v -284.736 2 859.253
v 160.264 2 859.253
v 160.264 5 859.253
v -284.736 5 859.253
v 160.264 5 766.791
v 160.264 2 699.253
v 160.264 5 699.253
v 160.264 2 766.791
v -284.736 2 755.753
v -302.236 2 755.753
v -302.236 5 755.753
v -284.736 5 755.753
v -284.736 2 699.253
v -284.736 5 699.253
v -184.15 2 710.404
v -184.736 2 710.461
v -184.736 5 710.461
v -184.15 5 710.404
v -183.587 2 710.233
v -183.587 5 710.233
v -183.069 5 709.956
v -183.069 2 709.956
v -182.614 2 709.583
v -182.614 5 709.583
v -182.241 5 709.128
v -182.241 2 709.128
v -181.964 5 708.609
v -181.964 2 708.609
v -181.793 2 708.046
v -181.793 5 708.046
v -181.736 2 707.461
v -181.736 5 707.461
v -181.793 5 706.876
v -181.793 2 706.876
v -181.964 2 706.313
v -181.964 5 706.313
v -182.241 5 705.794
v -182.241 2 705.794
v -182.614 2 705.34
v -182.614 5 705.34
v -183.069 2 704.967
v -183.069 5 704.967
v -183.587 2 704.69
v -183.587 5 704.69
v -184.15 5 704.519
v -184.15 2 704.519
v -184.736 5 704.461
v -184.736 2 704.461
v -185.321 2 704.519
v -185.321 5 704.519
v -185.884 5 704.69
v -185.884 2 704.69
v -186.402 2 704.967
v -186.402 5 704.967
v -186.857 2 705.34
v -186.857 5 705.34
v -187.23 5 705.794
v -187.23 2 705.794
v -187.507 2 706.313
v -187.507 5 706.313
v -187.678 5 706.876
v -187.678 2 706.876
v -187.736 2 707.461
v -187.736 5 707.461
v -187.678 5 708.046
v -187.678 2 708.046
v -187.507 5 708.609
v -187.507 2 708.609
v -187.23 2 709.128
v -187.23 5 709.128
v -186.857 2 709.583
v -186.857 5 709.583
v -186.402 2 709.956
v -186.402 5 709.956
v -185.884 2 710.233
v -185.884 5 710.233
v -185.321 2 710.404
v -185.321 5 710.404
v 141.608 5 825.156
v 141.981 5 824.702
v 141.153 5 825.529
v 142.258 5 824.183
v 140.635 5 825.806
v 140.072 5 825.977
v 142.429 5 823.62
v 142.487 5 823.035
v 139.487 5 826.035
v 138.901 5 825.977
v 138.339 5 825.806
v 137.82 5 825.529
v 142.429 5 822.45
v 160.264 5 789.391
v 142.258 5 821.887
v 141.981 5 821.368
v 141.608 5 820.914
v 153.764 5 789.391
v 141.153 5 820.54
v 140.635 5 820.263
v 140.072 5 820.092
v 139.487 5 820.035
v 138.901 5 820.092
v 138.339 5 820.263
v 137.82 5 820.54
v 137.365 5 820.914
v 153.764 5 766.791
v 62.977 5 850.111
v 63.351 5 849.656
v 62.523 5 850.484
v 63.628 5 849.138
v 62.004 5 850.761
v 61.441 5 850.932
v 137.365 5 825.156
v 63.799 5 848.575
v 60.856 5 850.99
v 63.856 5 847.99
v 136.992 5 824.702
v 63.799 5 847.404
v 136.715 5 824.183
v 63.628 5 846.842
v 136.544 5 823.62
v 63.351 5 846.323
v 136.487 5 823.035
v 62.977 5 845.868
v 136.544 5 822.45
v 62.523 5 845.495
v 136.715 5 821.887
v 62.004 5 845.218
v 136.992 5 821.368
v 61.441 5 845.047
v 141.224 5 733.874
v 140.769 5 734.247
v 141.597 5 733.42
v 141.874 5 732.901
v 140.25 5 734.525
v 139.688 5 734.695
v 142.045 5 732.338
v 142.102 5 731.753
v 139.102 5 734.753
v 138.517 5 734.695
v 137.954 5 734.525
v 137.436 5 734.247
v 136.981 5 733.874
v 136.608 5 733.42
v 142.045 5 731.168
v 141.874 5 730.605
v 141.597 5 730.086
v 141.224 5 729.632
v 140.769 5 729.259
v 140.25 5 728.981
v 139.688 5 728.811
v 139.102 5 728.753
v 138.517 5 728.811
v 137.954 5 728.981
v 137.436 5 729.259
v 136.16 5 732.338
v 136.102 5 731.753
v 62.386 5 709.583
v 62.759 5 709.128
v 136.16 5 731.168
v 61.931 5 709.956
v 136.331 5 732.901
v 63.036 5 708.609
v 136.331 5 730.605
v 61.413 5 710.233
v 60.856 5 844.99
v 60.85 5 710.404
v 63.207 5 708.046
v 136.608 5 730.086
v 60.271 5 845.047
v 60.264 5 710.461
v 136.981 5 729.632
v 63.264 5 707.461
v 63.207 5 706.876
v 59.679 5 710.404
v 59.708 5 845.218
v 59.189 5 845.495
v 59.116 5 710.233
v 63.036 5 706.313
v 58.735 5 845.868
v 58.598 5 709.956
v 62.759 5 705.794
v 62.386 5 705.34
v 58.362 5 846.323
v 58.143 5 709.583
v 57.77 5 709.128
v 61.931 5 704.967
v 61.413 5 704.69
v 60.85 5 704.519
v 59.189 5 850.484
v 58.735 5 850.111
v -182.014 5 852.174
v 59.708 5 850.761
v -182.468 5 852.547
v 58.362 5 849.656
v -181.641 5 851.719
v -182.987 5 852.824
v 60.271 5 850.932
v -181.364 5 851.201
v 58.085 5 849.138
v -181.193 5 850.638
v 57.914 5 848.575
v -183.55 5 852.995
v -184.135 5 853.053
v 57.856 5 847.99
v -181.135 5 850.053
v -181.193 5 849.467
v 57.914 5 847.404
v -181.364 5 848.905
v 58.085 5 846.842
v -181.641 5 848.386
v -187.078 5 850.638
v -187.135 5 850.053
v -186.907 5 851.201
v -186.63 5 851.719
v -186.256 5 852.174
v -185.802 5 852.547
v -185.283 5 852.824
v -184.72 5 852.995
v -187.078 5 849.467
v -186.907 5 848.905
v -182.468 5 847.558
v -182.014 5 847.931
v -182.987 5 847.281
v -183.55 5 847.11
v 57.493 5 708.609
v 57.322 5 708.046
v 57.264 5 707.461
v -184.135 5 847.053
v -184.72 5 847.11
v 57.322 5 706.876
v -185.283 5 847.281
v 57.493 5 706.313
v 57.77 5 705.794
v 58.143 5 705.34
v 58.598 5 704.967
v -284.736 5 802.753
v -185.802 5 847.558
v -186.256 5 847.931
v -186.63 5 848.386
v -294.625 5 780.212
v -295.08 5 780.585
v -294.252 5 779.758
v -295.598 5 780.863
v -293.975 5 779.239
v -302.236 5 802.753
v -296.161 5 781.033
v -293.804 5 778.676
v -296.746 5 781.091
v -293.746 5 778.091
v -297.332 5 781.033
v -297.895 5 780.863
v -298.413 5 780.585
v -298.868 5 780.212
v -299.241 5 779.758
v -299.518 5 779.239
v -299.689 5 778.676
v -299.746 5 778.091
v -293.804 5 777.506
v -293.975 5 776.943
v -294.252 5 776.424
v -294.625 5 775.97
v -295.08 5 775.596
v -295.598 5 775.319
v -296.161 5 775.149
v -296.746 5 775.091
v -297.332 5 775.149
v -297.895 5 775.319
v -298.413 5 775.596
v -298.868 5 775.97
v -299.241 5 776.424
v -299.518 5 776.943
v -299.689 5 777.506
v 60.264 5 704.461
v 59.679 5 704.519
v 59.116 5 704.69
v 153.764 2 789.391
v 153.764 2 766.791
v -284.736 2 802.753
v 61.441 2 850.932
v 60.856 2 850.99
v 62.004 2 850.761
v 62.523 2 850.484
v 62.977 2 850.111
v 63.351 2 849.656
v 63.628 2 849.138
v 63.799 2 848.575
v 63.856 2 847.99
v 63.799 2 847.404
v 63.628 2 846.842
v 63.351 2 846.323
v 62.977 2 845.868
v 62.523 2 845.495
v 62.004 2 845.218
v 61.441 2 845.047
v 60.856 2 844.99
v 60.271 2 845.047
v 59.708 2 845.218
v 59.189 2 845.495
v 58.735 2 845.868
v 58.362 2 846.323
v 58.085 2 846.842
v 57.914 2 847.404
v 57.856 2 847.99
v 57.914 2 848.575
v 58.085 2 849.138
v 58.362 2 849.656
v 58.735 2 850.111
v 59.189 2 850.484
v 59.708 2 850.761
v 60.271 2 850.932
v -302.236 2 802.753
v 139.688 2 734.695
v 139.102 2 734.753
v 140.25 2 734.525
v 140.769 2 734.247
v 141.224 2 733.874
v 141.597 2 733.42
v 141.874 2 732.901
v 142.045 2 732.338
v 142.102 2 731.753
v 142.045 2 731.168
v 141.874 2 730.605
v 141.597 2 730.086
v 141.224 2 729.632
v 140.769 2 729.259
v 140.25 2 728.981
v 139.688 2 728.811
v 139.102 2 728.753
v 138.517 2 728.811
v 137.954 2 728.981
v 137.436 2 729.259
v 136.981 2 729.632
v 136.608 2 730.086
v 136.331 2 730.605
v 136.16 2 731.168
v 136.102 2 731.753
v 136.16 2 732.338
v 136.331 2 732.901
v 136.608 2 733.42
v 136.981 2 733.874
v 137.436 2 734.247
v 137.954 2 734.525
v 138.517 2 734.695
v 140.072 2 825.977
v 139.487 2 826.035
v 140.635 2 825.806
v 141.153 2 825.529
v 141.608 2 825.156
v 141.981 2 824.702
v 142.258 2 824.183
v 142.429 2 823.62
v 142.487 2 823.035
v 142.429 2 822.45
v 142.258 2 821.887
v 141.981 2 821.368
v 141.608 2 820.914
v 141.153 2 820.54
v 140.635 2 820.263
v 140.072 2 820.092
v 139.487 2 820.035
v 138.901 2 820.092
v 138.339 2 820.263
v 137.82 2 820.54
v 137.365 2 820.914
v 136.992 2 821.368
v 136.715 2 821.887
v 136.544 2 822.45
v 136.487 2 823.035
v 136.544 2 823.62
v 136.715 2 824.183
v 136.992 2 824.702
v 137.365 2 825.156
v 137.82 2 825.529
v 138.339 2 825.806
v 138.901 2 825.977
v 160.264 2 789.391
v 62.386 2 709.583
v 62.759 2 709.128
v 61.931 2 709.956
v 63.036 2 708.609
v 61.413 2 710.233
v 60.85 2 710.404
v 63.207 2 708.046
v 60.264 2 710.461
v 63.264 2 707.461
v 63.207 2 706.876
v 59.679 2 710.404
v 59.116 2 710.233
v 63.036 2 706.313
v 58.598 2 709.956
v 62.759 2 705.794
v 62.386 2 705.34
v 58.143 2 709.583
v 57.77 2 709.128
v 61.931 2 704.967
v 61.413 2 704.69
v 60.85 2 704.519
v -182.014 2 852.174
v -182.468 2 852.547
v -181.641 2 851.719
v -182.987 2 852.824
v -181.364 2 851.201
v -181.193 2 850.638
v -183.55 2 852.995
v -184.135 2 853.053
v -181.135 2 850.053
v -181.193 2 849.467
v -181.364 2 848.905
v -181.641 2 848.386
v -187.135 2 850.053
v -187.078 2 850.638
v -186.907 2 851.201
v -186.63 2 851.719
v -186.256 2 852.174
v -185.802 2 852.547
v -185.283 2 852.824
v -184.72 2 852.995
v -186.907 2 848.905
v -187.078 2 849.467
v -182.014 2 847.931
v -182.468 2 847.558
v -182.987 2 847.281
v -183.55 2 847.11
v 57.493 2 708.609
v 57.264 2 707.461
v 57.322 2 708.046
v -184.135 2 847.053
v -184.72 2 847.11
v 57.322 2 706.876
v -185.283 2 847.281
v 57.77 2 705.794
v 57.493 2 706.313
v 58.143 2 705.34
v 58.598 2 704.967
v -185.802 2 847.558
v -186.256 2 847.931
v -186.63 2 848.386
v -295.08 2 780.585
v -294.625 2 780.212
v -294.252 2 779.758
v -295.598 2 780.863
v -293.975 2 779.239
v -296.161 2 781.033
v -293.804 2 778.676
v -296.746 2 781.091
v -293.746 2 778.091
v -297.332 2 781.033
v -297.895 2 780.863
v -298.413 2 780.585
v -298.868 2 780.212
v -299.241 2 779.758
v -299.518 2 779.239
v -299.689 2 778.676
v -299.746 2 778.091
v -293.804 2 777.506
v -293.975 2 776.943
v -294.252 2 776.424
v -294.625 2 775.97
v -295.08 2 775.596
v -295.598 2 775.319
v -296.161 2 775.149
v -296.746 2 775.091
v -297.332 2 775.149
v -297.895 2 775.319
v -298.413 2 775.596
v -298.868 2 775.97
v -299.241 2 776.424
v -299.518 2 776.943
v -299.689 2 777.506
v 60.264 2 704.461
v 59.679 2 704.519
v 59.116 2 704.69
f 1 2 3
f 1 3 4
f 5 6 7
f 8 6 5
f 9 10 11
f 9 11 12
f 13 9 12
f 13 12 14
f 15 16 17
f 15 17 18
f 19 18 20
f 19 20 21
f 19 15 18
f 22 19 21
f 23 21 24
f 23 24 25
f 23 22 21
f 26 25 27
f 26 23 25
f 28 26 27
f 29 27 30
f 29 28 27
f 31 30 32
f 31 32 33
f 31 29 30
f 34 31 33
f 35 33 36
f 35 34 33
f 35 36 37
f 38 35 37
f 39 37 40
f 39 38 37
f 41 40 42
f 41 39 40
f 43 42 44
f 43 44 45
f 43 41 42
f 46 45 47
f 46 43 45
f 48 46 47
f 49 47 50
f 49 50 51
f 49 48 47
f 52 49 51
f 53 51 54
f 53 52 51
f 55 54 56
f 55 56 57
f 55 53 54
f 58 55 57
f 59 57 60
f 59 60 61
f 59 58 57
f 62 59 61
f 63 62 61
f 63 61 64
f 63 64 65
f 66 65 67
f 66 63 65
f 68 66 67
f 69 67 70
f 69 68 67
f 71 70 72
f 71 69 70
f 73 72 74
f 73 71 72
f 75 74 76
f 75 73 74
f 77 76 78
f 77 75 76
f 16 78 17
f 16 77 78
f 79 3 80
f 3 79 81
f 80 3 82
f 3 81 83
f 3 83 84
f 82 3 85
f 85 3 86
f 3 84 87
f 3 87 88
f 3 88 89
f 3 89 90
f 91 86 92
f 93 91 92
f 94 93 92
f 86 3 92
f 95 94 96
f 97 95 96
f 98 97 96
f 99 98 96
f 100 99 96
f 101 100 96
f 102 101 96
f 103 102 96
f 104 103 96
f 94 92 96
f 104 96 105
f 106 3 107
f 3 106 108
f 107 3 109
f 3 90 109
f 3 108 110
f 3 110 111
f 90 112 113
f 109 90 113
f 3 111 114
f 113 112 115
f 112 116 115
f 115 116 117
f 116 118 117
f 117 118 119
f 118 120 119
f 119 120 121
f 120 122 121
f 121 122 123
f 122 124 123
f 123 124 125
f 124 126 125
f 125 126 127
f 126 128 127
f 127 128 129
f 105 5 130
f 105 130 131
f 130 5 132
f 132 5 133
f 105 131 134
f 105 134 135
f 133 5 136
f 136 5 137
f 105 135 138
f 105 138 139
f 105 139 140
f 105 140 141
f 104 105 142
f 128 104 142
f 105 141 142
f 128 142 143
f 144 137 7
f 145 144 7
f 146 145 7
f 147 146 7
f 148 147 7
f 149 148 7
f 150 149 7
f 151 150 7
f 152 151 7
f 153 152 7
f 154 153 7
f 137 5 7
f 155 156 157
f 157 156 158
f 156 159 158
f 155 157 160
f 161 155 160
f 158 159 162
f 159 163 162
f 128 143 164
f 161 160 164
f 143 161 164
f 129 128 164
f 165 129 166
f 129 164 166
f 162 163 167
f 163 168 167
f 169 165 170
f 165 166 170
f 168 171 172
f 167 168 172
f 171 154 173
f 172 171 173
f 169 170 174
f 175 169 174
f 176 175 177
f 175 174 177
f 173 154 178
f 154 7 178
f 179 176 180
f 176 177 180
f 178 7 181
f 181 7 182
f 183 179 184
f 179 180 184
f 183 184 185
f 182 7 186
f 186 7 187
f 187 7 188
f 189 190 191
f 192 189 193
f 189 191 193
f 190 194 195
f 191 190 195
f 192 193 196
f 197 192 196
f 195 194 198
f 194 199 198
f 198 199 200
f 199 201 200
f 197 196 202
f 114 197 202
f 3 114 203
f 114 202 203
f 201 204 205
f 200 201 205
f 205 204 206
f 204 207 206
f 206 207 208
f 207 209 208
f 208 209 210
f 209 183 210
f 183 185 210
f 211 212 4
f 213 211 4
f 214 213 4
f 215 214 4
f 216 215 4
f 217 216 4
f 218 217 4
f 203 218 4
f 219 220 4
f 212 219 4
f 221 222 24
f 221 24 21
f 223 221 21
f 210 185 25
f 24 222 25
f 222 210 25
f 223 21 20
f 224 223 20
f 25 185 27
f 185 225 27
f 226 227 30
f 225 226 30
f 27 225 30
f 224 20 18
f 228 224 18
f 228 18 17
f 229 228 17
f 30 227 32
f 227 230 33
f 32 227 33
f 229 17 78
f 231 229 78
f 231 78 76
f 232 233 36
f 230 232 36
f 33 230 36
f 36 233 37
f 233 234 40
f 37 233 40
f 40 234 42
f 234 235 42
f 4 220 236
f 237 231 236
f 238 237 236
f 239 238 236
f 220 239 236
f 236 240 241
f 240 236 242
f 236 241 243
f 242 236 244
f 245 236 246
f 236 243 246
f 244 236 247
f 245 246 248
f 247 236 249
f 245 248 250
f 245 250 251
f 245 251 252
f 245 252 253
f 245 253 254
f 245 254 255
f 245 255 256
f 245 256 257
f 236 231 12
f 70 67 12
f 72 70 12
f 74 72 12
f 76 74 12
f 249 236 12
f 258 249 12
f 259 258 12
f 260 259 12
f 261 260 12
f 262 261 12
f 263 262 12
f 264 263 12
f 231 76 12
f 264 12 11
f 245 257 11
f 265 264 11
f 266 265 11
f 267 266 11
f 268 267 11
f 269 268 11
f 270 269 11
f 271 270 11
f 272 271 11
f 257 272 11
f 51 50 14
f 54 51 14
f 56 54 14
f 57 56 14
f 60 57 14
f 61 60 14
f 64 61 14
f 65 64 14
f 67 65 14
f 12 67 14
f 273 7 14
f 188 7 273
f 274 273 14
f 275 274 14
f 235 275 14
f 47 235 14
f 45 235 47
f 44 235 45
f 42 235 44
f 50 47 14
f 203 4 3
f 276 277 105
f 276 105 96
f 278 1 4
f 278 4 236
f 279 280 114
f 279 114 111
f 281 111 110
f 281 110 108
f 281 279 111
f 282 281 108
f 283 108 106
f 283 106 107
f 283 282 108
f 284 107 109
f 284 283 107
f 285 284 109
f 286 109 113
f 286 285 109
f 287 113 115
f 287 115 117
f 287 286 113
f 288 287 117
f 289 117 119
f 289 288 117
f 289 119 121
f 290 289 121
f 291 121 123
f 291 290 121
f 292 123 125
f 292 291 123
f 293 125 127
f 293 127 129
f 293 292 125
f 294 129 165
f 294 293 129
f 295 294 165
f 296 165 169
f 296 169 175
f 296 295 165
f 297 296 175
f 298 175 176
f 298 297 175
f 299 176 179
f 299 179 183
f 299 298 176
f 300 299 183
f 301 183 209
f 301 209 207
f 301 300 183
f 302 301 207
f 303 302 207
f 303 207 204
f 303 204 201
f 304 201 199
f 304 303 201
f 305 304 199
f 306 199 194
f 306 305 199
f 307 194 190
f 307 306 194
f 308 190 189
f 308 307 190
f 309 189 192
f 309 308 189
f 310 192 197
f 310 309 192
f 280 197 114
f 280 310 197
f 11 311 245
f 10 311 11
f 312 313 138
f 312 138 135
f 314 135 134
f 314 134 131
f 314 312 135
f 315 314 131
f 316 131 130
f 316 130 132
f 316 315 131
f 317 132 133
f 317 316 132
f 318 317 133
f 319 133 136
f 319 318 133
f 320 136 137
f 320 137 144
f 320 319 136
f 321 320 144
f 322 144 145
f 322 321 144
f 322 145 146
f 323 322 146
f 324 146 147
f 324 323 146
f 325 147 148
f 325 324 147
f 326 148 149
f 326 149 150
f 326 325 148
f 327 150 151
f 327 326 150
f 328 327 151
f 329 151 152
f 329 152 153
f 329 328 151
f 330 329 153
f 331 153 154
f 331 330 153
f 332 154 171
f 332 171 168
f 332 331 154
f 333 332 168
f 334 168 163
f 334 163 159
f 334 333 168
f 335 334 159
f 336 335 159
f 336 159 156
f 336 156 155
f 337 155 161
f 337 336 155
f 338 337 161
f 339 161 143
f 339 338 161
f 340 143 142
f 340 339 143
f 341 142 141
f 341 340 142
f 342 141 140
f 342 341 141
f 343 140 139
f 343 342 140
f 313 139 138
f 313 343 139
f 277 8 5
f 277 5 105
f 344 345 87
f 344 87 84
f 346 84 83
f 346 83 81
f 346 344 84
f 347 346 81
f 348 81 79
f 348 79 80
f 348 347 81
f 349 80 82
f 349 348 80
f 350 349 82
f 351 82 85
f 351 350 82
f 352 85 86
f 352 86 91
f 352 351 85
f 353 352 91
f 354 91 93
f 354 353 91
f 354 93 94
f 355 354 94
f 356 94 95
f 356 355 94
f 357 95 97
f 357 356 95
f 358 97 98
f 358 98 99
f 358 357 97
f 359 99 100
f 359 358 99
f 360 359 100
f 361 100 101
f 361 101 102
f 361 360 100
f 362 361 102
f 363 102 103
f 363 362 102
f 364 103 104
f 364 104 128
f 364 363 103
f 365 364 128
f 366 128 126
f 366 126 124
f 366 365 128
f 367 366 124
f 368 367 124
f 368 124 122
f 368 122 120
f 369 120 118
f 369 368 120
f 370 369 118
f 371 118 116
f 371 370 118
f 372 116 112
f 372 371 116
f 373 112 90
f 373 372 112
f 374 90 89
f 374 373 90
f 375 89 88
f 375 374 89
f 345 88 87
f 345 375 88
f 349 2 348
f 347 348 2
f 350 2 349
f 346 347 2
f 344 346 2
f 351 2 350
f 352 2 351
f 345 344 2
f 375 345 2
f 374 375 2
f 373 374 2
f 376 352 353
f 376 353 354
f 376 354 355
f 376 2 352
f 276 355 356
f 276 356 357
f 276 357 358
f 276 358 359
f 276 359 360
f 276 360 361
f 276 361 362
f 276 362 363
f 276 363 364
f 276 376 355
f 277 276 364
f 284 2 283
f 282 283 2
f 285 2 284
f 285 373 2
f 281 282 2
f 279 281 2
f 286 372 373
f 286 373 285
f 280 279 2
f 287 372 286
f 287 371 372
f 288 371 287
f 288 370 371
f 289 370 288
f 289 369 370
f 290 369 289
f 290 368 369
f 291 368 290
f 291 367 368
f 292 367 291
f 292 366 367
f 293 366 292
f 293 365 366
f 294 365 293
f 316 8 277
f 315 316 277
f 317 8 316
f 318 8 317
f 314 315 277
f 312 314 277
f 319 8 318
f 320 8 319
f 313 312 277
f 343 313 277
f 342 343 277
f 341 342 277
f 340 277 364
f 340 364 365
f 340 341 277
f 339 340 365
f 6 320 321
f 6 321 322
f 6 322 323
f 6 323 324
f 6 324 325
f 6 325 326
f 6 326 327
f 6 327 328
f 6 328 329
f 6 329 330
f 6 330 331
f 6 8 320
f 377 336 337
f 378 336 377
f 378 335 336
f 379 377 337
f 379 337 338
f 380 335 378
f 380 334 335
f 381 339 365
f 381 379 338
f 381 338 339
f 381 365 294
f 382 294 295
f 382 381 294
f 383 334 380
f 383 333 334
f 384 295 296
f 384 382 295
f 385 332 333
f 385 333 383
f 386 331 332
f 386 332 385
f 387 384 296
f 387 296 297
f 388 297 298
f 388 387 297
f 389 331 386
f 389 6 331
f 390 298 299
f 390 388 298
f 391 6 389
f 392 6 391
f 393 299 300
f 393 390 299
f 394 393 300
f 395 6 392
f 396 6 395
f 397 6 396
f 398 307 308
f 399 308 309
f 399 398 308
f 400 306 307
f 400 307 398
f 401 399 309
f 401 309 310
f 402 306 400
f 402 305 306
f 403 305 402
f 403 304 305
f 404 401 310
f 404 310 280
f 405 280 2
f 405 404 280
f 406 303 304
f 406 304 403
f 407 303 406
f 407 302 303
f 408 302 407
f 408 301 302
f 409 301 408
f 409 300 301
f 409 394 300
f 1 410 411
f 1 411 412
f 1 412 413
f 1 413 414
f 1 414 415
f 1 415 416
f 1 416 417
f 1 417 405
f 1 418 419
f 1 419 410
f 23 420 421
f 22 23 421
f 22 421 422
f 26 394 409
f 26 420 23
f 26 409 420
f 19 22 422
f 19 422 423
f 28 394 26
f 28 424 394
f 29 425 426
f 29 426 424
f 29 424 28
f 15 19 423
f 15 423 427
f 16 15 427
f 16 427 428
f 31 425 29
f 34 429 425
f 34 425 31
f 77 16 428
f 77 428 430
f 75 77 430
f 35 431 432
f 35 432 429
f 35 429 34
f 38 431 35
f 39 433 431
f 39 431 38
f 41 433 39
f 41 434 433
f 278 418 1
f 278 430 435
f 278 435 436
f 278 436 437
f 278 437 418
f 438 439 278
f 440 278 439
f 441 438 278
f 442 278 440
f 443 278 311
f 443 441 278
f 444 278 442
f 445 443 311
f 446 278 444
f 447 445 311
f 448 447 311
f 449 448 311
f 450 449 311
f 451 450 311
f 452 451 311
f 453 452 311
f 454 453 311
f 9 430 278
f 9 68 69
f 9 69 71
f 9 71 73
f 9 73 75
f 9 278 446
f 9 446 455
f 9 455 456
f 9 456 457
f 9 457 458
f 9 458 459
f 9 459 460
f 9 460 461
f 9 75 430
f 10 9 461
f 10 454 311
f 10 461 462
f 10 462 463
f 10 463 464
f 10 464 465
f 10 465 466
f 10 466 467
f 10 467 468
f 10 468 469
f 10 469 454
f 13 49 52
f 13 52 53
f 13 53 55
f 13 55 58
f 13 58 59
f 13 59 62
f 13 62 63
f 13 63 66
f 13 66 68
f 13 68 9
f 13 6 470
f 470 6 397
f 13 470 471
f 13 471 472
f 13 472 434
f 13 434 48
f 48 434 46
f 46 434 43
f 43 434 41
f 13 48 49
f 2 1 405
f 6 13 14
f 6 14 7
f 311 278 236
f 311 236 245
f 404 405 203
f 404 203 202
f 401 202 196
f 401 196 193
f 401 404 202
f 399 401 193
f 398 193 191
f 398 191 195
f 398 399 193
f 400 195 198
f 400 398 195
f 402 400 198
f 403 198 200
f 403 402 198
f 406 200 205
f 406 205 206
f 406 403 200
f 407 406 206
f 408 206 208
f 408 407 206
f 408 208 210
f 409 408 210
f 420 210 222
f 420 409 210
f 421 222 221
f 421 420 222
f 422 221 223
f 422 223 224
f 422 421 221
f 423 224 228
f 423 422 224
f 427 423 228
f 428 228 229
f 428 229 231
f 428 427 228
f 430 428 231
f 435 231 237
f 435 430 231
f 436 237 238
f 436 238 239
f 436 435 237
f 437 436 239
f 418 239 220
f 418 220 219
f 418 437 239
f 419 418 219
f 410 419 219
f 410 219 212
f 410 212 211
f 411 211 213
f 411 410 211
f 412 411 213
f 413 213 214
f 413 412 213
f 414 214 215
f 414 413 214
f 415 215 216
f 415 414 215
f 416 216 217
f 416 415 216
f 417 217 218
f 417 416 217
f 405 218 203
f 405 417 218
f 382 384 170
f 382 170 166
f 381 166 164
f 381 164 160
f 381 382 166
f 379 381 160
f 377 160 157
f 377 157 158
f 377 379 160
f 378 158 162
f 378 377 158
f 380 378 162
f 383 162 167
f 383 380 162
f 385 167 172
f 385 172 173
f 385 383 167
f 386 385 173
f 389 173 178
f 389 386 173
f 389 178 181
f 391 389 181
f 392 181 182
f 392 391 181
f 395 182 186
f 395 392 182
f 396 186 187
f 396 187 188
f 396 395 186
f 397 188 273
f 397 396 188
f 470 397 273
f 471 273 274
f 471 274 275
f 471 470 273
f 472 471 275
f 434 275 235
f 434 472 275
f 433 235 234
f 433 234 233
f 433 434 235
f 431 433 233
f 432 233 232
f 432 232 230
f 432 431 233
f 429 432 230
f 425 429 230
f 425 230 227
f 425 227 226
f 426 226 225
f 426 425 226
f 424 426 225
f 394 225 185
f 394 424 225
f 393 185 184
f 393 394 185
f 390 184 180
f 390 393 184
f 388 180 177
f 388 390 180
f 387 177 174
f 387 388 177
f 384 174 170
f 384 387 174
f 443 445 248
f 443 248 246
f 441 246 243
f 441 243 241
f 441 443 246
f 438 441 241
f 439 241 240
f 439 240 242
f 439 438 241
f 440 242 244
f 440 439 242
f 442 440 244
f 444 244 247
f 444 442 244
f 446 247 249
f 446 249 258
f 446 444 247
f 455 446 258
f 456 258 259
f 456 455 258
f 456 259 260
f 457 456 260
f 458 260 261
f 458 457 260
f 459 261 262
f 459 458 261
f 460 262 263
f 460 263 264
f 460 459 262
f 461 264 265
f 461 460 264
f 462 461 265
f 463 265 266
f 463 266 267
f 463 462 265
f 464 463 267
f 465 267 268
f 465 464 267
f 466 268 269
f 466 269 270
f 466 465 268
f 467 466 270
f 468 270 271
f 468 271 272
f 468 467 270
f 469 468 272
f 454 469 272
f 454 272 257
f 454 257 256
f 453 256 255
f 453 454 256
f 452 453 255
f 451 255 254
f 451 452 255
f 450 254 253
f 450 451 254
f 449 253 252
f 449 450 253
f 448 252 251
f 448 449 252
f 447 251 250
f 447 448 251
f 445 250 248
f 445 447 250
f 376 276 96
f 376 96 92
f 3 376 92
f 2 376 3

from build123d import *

# Parameters (mm, degrees)
BOSS_EXTRUDE1_START = 2
SKETCH1_R           = 3
SKETCH1_R_2         = 3.000000004
SKETCH1_R_3         = 2.999999993
BOSS_EXTRUDE1_DEPTH = 3


with BuildPart() as part:
    # Sketch1 → Boss-Extrude1 (new body)
    with BuildSketch(Plane(origin=(0, 0, 0), x_dir=(1, 0, 0), z_dir=(0, 1, 0)).offset(BOSS_EXTRUDE1_START)):
        Polygon((-302.235528935, -755.752958265), (-284.735528935, -755.752958265), (-284.735528935, -699.252958265), (160.264471065, -699.252958265), (160.264471065, -766.790866852), (153.764471065, -766.790866852), (153.764471065, -789.390866852), (160.264471065, -789.390866852), (160.264471065, -859.252958265), (-284.735528935, -859.252958265), (-284.735528935, -802.752958265), (-302.235528935, -802.752958265), align=None)
        with Locations(Location((-296.74646616, -778.09086684, 0), (0, 0, 270))):
            Circle(SKETCH1_R, mode=Mode.SUBTRACT)
        with Locations(Location((139.102370463, -731.752958265, 0), (0, 0, 270))):
            Circle(SKETCH1_R_2, mode=Mode.SUBTRACT)
        with Locations(Location((139.486711965, -823.034841954, 0), (0, 0, 270))):
            Circle(SKETCH1_R, mode=Mode.SUBTRACT)
        with Locations(Location((-184.735528935, -707.46118256, 0), (0, 0, 270))):
            Circle(SKETCH1_R_2, mode=Mode.SUBTRACT)
        with Locations(Location((60.264471065, -707.46118256, 0), (0, 0, 270))):
            Circle(SKETCH1_R_2, mode=Mode.SUBTRACT)
        with Locations(Location((60.856164784, -847.989637054, 0), (0, 0, 270))):
            Circle(SKETCH1_R, mode=Mode.SUBTRACT)
        with Locations(Location((-184.135148537, -850.052740812, 0), (0, 0, 270))):
            Circle(SKETCH1_R_3, mode=Mode.SUBTRACT)
    extrude(amount=BOSS_EXTRUDE1_DEPTH)


solid = part.part
